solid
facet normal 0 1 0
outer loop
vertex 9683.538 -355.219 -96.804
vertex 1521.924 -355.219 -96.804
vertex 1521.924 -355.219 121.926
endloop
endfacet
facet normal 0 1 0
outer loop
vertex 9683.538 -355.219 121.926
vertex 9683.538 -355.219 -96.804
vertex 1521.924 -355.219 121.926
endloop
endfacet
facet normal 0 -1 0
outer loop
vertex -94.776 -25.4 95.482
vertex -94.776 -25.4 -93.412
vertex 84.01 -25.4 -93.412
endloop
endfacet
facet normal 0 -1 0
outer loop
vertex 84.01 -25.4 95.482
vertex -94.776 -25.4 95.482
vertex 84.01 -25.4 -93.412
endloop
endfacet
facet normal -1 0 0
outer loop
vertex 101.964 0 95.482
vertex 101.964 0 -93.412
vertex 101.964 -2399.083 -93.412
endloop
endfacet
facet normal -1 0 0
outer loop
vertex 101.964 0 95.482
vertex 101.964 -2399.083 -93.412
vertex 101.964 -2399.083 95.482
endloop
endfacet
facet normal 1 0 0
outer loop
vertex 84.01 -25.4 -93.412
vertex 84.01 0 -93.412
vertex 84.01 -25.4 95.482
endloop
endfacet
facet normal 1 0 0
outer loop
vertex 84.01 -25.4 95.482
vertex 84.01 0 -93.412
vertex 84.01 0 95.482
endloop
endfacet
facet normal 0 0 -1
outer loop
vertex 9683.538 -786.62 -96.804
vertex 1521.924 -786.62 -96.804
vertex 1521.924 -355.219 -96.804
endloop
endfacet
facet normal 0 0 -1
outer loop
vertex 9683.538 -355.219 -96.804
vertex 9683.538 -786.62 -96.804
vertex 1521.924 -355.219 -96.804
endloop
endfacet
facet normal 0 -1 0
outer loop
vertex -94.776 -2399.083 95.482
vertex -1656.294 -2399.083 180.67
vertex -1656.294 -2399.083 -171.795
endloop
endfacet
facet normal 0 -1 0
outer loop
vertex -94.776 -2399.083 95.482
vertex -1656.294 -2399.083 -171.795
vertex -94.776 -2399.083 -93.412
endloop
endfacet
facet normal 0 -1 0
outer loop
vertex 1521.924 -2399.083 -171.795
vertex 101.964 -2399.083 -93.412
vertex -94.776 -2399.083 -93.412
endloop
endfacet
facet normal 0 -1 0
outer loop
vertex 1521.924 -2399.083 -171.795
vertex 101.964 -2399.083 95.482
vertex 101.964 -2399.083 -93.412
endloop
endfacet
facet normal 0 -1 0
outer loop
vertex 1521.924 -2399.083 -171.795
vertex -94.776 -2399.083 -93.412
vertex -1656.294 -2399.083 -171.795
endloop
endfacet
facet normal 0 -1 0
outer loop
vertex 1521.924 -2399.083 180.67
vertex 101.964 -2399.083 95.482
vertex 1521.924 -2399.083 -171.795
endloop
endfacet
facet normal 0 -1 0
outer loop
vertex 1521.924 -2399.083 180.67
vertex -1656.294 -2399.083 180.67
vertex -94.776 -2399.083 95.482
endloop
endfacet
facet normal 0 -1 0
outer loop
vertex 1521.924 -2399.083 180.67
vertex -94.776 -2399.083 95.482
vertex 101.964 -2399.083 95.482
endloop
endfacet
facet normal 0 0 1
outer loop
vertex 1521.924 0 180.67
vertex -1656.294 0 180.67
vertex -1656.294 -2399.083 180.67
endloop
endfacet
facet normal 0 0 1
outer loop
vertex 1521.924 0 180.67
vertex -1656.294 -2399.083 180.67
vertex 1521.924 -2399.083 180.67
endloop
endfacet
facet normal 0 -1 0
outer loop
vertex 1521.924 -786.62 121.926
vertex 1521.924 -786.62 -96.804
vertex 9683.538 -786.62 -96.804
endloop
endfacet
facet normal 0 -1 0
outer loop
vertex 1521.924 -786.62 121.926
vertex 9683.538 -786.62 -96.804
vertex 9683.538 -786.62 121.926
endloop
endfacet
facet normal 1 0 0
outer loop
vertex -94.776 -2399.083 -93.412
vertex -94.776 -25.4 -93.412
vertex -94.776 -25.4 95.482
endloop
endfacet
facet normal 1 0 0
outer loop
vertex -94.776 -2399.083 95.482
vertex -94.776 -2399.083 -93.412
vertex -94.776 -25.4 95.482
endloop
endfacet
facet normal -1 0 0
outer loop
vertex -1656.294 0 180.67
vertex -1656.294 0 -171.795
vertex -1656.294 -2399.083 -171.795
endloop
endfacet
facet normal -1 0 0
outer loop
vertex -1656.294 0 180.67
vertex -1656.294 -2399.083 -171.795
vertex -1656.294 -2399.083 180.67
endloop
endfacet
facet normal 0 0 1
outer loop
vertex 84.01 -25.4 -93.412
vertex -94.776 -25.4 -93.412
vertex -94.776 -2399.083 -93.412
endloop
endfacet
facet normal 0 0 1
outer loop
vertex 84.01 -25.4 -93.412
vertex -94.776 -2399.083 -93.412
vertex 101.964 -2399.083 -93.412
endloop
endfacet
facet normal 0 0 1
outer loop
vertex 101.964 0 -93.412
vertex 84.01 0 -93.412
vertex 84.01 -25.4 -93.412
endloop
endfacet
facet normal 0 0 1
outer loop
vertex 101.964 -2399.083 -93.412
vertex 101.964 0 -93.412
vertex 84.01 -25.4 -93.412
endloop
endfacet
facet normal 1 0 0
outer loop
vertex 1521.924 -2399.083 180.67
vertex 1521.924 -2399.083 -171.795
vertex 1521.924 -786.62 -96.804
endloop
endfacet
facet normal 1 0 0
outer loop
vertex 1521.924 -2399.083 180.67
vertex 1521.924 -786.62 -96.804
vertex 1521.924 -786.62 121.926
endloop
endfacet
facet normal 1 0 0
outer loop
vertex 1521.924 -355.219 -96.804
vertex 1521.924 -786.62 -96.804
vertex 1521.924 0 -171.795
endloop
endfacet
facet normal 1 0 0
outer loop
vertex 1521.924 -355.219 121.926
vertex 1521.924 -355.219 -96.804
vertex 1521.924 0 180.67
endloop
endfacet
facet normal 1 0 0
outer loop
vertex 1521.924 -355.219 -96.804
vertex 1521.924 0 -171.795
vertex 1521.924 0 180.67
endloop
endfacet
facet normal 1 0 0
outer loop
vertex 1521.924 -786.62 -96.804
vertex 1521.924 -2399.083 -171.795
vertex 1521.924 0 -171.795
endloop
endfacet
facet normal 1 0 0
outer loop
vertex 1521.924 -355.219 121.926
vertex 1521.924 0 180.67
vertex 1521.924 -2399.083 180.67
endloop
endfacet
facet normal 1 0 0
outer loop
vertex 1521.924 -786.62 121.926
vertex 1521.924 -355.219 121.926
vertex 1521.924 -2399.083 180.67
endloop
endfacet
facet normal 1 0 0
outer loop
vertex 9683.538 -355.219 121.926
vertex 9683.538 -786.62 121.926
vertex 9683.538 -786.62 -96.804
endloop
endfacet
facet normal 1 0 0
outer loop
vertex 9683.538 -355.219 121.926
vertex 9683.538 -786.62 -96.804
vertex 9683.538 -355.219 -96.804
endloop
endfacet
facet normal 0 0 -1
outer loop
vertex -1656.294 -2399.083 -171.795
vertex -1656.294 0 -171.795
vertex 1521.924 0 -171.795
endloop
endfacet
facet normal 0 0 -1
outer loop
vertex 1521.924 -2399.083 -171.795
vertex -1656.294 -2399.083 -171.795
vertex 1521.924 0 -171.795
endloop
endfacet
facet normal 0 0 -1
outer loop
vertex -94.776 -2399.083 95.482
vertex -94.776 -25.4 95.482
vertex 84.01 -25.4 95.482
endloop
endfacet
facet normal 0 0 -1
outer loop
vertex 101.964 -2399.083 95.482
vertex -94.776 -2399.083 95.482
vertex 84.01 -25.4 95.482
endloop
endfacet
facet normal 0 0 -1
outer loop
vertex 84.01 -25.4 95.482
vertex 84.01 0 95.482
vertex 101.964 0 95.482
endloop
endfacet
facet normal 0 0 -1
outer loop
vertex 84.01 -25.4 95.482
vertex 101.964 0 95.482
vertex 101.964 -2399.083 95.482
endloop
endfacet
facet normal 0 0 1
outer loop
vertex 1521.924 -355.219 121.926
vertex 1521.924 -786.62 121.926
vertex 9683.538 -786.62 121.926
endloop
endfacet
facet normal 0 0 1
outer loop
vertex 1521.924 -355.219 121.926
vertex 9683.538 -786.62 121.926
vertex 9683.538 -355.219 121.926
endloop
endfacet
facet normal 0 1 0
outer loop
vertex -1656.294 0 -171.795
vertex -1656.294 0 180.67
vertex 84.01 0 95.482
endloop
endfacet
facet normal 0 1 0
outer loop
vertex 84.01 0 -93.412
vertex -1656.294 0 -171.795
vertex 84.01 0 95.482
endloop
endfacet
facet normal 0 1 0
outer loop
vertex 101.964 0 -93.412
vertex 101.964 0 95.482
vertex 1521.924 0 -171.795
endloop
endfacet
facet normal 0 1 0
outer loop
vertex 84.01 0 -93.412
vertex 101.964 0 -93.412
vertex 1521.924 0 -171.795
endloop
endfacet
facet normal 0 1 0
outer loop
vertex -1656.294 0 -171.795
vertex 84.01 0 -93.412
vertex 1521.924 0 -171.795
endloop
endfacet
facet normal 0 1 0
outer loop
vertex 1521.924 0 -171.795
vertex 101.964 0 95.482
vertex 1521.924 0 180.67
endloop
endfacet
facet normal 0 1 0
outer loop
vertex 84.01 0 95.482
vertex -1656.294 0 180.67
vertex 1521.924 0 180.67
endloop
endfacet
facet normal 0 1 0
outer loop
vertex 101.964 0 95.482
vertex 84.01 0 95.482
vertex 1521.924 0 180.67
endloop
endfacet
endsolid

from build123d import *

# Parameters (mm, degrees)
F0_W     = 3178.218365
F0_H     = 352.465406
F0_W_2   = 196.740776
F0_H_2   = 188.893698
F1_DEPTH = 2399.083138
F2_W     = 302.773371
F2_H     = 302.019119
F3_DEPTH = 25.4
F4_W     = 431.400299
F4_H     = 218.729809
F5_DEPTH = 25.4
F6_W     = 431.400299
F6_H     = 218.729809
F7_DEPTH = 8136.214256


with BuildPart() as f1:
    # F0 (on Front) → F1 (new body)
    with BuildSketch(Plane.XZ):
        with Locations((-67.185163, 4.43732)):
            Rectangle(F0_W, F0_H)
        with Locations((3.594011, 1.034964)):
            Rectangle(F0_W_2, F0_H_2, mode=Mode.SUBTRACT)
    extrude(amount=F1_DEPTH)

    # F2 (on Front) → F3 (join)
    with BuildSketch(Plane.XZ):
        with Locations((-67.37674, 3.199696)):
            Rectangle(F2_W, F2_H)
    extrude(amount=F3_DEPTH)

    # F4 (on face) → F5 (join)
    with BuildSketch(Plane.YZ.offset(1521.924019)):
        with Locations((-570.919394, 12.561157)):
            Rectangle(F4_W, F4_H)
    extrude(amount=F5_DEPTH)

    # F6 (on face) → F7 (join)
    with BuildSketch(Plane.YZ.offset(1547.324019)):
        with Locations((-570.919394, 12.561157)):
            Rectangle(F6_W, F6_H)
    extrude(amount=F7_DEPTH)


solid = f1.part
